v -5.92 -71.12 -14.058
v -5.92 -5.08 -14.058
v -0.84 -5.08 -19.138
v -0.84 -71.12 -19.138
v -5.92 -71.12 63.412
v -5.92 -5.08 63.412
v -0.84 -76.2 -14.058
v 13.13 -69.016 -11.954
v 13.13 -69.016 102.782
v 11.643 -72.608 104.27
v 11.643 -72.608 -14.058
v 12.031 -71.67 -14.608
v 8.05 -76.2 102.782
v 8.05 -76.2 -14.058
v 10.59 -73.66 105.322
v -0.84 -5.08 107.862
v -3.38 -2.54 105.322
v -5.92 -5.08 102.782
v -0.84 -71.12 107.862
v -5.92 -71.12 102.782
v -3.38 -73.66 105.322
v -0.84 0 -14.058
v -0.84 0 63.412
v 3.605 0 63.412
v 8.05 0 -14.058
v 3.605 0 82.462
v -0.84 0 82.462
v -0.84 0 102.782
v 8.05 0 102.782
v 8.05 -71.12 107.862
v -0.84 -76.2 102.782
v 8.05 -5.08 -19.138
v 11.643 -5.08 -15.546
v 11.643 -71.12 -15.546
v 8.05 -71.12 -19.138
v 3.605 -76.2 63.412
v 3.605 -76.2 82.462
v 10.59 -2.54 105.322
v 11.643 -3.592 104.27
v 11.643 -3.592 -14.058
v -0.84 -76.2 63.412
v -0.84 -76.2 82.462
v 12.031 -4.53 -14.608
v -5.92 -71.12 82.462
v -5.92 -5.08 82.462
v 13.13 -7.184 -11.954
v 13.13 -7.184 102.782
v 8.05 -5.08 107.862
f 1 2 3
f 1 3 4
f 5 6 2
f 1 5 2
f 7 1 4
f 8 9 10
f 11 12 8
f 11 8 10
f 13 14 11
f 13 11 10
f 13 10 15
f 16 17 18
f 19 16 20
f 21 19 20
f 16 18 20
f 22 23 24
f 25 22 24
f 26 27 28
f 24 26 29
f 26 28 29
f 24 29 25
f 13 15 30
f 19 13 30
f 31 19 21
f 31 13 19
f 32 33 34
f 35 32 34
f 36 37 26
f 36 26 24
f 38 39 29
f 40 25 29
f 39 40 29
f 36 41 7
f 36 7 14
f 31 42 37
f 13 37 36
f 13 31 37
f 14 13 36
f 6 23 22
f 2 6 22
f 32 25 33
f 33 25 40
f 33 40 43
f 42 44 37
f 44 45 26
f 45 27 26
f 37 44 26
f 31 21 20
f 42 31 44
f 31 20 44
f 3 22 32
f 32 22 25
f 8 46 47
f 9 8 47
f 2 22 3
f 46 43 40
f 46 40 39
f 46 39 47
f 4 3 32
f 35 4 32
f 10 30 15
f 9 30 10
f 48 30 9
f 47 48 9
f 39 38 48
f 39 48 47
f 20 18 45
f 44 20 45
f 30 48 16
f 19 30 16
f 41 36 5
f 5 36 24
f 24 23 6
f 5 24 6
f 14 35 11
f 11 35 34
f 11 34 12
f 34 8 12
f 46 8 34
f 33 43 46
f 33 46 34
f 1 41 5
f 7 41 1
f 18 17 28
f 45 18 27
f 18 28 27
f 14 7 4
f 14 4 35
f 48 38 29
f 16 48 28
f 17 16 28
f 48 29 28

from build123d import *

# Parameters (mm, degrees)
F1_DEPTH    = 76.2
F2_SIZE     = 5.08
F3_SIZE     = 5.08
F4_SIZE     = 5.08
F5_T1_DEPTH = 92.1682991577
F5_T3_DEPTH = 133.3862799398
F5_T5_DEPTH = 77.5062799398


# Not quite as in the source:
# - a fillet or chamfer that OpenCascade refuses, or shapes differently, is made with other operations: its cross-section is extruded or revolved along the edge and cut away or added


with BuildPart() as f1:
    # F0 (on Front) → F1 (new body)
    with BuildSketch(Plane.XZ):
        Polygon((-5.919593852, -19.1378965259), (13.130406148, -19.1378965259), (13.130406148, 107.8621034741), (-5.919593852, 107.8621034741), (-5.919593852, 82.4621034741), (3.605406148, 82.4621034741), (3.605406148, 63.4121034741), (-5.919593852, 63.4121034741), align=None)
    extrude(amount=F1_DEPTH)

    # F2
    f2_edges = [f1.edges().sort_by_distance(p)[0] for p in [
        (-5.919594, 0, 95.162103),
        (13.130406, 0, 44.362103),
        (3.605406, 0, -19.137897),
        (-5.919594, 0, 22.137103),
        (-5.919594, -38.1, -19.137897),
        (-5.919594, -76.2, 22.137103),
        (13.130406, -38.1, -19.137897),
        (3.605406, -76.2, -19.137897),
        (13.130406, -76.2, 44.362103),
        (3.605406, -76.2, 107.862103),
        (-5.919594, -38.1, 107.862103),
    ]]
    chamfer(f2_edges, length=F2_SIZE)

    # F3
    f3_edges = [f1.edges().sort_by_distance(p)[0] for p in [
        (-5.919594, -76.2, 92.622103),
    ]]
    chamfer(f3_edges, length=F3_SIZE)

    # F4
    f4_edges = [f1.edges().sort_by_distance(p)[0] for p in [
        (3.605406, 0, 107.862103),
    ]]
    chamfer(f4_edges, length=F4_SIZE)

    # F5: chamfer of 5.08 on 4 edges, made by hand

    # F5_s2 → F5_t1 (cut)
    with BuildSketch(Plane.XZ.offset(-7.9841495789)):
        Polygon((8.050406148, 107.8621034741), (13.130406148, 102.7821034741), (13.130406148, 107.8621034741), align=None)
    extrude(amount=F5_T1_DEPTH, mode=Mode.SUBTRACT)

    # F5_s4 → F5_t3 (cut)
    with BuildSketch(Plane.XY.offset(-19.7910364957)):
        Polygon((13.130406148, -69.0157951031), (11.6425085964, -72.6078975516), (13.130406148, -71.12), align=None)
        Polygon((11.6425085964, -3.5921024484), (13.130406148, -7.1842048969), (13.130406148, -5.08), align=None)
    extrude(amount=F5_T3_DEPTH, mode=Mode.SUBTRACT)

    # F5_s6 → F5_t5 (cut)
    with BuildSketch(Plane.XZ.offset(-0.6531399699)):
        Polygon((13.130406148, -11.953691629), (11.6425085964, -15.5457940774), (13.130406148, -14.0578965259), align=None)
    extrude(amount=F5_T5_DEPTH, mode=Mode.SUBTRACT)


solid = f1.part
